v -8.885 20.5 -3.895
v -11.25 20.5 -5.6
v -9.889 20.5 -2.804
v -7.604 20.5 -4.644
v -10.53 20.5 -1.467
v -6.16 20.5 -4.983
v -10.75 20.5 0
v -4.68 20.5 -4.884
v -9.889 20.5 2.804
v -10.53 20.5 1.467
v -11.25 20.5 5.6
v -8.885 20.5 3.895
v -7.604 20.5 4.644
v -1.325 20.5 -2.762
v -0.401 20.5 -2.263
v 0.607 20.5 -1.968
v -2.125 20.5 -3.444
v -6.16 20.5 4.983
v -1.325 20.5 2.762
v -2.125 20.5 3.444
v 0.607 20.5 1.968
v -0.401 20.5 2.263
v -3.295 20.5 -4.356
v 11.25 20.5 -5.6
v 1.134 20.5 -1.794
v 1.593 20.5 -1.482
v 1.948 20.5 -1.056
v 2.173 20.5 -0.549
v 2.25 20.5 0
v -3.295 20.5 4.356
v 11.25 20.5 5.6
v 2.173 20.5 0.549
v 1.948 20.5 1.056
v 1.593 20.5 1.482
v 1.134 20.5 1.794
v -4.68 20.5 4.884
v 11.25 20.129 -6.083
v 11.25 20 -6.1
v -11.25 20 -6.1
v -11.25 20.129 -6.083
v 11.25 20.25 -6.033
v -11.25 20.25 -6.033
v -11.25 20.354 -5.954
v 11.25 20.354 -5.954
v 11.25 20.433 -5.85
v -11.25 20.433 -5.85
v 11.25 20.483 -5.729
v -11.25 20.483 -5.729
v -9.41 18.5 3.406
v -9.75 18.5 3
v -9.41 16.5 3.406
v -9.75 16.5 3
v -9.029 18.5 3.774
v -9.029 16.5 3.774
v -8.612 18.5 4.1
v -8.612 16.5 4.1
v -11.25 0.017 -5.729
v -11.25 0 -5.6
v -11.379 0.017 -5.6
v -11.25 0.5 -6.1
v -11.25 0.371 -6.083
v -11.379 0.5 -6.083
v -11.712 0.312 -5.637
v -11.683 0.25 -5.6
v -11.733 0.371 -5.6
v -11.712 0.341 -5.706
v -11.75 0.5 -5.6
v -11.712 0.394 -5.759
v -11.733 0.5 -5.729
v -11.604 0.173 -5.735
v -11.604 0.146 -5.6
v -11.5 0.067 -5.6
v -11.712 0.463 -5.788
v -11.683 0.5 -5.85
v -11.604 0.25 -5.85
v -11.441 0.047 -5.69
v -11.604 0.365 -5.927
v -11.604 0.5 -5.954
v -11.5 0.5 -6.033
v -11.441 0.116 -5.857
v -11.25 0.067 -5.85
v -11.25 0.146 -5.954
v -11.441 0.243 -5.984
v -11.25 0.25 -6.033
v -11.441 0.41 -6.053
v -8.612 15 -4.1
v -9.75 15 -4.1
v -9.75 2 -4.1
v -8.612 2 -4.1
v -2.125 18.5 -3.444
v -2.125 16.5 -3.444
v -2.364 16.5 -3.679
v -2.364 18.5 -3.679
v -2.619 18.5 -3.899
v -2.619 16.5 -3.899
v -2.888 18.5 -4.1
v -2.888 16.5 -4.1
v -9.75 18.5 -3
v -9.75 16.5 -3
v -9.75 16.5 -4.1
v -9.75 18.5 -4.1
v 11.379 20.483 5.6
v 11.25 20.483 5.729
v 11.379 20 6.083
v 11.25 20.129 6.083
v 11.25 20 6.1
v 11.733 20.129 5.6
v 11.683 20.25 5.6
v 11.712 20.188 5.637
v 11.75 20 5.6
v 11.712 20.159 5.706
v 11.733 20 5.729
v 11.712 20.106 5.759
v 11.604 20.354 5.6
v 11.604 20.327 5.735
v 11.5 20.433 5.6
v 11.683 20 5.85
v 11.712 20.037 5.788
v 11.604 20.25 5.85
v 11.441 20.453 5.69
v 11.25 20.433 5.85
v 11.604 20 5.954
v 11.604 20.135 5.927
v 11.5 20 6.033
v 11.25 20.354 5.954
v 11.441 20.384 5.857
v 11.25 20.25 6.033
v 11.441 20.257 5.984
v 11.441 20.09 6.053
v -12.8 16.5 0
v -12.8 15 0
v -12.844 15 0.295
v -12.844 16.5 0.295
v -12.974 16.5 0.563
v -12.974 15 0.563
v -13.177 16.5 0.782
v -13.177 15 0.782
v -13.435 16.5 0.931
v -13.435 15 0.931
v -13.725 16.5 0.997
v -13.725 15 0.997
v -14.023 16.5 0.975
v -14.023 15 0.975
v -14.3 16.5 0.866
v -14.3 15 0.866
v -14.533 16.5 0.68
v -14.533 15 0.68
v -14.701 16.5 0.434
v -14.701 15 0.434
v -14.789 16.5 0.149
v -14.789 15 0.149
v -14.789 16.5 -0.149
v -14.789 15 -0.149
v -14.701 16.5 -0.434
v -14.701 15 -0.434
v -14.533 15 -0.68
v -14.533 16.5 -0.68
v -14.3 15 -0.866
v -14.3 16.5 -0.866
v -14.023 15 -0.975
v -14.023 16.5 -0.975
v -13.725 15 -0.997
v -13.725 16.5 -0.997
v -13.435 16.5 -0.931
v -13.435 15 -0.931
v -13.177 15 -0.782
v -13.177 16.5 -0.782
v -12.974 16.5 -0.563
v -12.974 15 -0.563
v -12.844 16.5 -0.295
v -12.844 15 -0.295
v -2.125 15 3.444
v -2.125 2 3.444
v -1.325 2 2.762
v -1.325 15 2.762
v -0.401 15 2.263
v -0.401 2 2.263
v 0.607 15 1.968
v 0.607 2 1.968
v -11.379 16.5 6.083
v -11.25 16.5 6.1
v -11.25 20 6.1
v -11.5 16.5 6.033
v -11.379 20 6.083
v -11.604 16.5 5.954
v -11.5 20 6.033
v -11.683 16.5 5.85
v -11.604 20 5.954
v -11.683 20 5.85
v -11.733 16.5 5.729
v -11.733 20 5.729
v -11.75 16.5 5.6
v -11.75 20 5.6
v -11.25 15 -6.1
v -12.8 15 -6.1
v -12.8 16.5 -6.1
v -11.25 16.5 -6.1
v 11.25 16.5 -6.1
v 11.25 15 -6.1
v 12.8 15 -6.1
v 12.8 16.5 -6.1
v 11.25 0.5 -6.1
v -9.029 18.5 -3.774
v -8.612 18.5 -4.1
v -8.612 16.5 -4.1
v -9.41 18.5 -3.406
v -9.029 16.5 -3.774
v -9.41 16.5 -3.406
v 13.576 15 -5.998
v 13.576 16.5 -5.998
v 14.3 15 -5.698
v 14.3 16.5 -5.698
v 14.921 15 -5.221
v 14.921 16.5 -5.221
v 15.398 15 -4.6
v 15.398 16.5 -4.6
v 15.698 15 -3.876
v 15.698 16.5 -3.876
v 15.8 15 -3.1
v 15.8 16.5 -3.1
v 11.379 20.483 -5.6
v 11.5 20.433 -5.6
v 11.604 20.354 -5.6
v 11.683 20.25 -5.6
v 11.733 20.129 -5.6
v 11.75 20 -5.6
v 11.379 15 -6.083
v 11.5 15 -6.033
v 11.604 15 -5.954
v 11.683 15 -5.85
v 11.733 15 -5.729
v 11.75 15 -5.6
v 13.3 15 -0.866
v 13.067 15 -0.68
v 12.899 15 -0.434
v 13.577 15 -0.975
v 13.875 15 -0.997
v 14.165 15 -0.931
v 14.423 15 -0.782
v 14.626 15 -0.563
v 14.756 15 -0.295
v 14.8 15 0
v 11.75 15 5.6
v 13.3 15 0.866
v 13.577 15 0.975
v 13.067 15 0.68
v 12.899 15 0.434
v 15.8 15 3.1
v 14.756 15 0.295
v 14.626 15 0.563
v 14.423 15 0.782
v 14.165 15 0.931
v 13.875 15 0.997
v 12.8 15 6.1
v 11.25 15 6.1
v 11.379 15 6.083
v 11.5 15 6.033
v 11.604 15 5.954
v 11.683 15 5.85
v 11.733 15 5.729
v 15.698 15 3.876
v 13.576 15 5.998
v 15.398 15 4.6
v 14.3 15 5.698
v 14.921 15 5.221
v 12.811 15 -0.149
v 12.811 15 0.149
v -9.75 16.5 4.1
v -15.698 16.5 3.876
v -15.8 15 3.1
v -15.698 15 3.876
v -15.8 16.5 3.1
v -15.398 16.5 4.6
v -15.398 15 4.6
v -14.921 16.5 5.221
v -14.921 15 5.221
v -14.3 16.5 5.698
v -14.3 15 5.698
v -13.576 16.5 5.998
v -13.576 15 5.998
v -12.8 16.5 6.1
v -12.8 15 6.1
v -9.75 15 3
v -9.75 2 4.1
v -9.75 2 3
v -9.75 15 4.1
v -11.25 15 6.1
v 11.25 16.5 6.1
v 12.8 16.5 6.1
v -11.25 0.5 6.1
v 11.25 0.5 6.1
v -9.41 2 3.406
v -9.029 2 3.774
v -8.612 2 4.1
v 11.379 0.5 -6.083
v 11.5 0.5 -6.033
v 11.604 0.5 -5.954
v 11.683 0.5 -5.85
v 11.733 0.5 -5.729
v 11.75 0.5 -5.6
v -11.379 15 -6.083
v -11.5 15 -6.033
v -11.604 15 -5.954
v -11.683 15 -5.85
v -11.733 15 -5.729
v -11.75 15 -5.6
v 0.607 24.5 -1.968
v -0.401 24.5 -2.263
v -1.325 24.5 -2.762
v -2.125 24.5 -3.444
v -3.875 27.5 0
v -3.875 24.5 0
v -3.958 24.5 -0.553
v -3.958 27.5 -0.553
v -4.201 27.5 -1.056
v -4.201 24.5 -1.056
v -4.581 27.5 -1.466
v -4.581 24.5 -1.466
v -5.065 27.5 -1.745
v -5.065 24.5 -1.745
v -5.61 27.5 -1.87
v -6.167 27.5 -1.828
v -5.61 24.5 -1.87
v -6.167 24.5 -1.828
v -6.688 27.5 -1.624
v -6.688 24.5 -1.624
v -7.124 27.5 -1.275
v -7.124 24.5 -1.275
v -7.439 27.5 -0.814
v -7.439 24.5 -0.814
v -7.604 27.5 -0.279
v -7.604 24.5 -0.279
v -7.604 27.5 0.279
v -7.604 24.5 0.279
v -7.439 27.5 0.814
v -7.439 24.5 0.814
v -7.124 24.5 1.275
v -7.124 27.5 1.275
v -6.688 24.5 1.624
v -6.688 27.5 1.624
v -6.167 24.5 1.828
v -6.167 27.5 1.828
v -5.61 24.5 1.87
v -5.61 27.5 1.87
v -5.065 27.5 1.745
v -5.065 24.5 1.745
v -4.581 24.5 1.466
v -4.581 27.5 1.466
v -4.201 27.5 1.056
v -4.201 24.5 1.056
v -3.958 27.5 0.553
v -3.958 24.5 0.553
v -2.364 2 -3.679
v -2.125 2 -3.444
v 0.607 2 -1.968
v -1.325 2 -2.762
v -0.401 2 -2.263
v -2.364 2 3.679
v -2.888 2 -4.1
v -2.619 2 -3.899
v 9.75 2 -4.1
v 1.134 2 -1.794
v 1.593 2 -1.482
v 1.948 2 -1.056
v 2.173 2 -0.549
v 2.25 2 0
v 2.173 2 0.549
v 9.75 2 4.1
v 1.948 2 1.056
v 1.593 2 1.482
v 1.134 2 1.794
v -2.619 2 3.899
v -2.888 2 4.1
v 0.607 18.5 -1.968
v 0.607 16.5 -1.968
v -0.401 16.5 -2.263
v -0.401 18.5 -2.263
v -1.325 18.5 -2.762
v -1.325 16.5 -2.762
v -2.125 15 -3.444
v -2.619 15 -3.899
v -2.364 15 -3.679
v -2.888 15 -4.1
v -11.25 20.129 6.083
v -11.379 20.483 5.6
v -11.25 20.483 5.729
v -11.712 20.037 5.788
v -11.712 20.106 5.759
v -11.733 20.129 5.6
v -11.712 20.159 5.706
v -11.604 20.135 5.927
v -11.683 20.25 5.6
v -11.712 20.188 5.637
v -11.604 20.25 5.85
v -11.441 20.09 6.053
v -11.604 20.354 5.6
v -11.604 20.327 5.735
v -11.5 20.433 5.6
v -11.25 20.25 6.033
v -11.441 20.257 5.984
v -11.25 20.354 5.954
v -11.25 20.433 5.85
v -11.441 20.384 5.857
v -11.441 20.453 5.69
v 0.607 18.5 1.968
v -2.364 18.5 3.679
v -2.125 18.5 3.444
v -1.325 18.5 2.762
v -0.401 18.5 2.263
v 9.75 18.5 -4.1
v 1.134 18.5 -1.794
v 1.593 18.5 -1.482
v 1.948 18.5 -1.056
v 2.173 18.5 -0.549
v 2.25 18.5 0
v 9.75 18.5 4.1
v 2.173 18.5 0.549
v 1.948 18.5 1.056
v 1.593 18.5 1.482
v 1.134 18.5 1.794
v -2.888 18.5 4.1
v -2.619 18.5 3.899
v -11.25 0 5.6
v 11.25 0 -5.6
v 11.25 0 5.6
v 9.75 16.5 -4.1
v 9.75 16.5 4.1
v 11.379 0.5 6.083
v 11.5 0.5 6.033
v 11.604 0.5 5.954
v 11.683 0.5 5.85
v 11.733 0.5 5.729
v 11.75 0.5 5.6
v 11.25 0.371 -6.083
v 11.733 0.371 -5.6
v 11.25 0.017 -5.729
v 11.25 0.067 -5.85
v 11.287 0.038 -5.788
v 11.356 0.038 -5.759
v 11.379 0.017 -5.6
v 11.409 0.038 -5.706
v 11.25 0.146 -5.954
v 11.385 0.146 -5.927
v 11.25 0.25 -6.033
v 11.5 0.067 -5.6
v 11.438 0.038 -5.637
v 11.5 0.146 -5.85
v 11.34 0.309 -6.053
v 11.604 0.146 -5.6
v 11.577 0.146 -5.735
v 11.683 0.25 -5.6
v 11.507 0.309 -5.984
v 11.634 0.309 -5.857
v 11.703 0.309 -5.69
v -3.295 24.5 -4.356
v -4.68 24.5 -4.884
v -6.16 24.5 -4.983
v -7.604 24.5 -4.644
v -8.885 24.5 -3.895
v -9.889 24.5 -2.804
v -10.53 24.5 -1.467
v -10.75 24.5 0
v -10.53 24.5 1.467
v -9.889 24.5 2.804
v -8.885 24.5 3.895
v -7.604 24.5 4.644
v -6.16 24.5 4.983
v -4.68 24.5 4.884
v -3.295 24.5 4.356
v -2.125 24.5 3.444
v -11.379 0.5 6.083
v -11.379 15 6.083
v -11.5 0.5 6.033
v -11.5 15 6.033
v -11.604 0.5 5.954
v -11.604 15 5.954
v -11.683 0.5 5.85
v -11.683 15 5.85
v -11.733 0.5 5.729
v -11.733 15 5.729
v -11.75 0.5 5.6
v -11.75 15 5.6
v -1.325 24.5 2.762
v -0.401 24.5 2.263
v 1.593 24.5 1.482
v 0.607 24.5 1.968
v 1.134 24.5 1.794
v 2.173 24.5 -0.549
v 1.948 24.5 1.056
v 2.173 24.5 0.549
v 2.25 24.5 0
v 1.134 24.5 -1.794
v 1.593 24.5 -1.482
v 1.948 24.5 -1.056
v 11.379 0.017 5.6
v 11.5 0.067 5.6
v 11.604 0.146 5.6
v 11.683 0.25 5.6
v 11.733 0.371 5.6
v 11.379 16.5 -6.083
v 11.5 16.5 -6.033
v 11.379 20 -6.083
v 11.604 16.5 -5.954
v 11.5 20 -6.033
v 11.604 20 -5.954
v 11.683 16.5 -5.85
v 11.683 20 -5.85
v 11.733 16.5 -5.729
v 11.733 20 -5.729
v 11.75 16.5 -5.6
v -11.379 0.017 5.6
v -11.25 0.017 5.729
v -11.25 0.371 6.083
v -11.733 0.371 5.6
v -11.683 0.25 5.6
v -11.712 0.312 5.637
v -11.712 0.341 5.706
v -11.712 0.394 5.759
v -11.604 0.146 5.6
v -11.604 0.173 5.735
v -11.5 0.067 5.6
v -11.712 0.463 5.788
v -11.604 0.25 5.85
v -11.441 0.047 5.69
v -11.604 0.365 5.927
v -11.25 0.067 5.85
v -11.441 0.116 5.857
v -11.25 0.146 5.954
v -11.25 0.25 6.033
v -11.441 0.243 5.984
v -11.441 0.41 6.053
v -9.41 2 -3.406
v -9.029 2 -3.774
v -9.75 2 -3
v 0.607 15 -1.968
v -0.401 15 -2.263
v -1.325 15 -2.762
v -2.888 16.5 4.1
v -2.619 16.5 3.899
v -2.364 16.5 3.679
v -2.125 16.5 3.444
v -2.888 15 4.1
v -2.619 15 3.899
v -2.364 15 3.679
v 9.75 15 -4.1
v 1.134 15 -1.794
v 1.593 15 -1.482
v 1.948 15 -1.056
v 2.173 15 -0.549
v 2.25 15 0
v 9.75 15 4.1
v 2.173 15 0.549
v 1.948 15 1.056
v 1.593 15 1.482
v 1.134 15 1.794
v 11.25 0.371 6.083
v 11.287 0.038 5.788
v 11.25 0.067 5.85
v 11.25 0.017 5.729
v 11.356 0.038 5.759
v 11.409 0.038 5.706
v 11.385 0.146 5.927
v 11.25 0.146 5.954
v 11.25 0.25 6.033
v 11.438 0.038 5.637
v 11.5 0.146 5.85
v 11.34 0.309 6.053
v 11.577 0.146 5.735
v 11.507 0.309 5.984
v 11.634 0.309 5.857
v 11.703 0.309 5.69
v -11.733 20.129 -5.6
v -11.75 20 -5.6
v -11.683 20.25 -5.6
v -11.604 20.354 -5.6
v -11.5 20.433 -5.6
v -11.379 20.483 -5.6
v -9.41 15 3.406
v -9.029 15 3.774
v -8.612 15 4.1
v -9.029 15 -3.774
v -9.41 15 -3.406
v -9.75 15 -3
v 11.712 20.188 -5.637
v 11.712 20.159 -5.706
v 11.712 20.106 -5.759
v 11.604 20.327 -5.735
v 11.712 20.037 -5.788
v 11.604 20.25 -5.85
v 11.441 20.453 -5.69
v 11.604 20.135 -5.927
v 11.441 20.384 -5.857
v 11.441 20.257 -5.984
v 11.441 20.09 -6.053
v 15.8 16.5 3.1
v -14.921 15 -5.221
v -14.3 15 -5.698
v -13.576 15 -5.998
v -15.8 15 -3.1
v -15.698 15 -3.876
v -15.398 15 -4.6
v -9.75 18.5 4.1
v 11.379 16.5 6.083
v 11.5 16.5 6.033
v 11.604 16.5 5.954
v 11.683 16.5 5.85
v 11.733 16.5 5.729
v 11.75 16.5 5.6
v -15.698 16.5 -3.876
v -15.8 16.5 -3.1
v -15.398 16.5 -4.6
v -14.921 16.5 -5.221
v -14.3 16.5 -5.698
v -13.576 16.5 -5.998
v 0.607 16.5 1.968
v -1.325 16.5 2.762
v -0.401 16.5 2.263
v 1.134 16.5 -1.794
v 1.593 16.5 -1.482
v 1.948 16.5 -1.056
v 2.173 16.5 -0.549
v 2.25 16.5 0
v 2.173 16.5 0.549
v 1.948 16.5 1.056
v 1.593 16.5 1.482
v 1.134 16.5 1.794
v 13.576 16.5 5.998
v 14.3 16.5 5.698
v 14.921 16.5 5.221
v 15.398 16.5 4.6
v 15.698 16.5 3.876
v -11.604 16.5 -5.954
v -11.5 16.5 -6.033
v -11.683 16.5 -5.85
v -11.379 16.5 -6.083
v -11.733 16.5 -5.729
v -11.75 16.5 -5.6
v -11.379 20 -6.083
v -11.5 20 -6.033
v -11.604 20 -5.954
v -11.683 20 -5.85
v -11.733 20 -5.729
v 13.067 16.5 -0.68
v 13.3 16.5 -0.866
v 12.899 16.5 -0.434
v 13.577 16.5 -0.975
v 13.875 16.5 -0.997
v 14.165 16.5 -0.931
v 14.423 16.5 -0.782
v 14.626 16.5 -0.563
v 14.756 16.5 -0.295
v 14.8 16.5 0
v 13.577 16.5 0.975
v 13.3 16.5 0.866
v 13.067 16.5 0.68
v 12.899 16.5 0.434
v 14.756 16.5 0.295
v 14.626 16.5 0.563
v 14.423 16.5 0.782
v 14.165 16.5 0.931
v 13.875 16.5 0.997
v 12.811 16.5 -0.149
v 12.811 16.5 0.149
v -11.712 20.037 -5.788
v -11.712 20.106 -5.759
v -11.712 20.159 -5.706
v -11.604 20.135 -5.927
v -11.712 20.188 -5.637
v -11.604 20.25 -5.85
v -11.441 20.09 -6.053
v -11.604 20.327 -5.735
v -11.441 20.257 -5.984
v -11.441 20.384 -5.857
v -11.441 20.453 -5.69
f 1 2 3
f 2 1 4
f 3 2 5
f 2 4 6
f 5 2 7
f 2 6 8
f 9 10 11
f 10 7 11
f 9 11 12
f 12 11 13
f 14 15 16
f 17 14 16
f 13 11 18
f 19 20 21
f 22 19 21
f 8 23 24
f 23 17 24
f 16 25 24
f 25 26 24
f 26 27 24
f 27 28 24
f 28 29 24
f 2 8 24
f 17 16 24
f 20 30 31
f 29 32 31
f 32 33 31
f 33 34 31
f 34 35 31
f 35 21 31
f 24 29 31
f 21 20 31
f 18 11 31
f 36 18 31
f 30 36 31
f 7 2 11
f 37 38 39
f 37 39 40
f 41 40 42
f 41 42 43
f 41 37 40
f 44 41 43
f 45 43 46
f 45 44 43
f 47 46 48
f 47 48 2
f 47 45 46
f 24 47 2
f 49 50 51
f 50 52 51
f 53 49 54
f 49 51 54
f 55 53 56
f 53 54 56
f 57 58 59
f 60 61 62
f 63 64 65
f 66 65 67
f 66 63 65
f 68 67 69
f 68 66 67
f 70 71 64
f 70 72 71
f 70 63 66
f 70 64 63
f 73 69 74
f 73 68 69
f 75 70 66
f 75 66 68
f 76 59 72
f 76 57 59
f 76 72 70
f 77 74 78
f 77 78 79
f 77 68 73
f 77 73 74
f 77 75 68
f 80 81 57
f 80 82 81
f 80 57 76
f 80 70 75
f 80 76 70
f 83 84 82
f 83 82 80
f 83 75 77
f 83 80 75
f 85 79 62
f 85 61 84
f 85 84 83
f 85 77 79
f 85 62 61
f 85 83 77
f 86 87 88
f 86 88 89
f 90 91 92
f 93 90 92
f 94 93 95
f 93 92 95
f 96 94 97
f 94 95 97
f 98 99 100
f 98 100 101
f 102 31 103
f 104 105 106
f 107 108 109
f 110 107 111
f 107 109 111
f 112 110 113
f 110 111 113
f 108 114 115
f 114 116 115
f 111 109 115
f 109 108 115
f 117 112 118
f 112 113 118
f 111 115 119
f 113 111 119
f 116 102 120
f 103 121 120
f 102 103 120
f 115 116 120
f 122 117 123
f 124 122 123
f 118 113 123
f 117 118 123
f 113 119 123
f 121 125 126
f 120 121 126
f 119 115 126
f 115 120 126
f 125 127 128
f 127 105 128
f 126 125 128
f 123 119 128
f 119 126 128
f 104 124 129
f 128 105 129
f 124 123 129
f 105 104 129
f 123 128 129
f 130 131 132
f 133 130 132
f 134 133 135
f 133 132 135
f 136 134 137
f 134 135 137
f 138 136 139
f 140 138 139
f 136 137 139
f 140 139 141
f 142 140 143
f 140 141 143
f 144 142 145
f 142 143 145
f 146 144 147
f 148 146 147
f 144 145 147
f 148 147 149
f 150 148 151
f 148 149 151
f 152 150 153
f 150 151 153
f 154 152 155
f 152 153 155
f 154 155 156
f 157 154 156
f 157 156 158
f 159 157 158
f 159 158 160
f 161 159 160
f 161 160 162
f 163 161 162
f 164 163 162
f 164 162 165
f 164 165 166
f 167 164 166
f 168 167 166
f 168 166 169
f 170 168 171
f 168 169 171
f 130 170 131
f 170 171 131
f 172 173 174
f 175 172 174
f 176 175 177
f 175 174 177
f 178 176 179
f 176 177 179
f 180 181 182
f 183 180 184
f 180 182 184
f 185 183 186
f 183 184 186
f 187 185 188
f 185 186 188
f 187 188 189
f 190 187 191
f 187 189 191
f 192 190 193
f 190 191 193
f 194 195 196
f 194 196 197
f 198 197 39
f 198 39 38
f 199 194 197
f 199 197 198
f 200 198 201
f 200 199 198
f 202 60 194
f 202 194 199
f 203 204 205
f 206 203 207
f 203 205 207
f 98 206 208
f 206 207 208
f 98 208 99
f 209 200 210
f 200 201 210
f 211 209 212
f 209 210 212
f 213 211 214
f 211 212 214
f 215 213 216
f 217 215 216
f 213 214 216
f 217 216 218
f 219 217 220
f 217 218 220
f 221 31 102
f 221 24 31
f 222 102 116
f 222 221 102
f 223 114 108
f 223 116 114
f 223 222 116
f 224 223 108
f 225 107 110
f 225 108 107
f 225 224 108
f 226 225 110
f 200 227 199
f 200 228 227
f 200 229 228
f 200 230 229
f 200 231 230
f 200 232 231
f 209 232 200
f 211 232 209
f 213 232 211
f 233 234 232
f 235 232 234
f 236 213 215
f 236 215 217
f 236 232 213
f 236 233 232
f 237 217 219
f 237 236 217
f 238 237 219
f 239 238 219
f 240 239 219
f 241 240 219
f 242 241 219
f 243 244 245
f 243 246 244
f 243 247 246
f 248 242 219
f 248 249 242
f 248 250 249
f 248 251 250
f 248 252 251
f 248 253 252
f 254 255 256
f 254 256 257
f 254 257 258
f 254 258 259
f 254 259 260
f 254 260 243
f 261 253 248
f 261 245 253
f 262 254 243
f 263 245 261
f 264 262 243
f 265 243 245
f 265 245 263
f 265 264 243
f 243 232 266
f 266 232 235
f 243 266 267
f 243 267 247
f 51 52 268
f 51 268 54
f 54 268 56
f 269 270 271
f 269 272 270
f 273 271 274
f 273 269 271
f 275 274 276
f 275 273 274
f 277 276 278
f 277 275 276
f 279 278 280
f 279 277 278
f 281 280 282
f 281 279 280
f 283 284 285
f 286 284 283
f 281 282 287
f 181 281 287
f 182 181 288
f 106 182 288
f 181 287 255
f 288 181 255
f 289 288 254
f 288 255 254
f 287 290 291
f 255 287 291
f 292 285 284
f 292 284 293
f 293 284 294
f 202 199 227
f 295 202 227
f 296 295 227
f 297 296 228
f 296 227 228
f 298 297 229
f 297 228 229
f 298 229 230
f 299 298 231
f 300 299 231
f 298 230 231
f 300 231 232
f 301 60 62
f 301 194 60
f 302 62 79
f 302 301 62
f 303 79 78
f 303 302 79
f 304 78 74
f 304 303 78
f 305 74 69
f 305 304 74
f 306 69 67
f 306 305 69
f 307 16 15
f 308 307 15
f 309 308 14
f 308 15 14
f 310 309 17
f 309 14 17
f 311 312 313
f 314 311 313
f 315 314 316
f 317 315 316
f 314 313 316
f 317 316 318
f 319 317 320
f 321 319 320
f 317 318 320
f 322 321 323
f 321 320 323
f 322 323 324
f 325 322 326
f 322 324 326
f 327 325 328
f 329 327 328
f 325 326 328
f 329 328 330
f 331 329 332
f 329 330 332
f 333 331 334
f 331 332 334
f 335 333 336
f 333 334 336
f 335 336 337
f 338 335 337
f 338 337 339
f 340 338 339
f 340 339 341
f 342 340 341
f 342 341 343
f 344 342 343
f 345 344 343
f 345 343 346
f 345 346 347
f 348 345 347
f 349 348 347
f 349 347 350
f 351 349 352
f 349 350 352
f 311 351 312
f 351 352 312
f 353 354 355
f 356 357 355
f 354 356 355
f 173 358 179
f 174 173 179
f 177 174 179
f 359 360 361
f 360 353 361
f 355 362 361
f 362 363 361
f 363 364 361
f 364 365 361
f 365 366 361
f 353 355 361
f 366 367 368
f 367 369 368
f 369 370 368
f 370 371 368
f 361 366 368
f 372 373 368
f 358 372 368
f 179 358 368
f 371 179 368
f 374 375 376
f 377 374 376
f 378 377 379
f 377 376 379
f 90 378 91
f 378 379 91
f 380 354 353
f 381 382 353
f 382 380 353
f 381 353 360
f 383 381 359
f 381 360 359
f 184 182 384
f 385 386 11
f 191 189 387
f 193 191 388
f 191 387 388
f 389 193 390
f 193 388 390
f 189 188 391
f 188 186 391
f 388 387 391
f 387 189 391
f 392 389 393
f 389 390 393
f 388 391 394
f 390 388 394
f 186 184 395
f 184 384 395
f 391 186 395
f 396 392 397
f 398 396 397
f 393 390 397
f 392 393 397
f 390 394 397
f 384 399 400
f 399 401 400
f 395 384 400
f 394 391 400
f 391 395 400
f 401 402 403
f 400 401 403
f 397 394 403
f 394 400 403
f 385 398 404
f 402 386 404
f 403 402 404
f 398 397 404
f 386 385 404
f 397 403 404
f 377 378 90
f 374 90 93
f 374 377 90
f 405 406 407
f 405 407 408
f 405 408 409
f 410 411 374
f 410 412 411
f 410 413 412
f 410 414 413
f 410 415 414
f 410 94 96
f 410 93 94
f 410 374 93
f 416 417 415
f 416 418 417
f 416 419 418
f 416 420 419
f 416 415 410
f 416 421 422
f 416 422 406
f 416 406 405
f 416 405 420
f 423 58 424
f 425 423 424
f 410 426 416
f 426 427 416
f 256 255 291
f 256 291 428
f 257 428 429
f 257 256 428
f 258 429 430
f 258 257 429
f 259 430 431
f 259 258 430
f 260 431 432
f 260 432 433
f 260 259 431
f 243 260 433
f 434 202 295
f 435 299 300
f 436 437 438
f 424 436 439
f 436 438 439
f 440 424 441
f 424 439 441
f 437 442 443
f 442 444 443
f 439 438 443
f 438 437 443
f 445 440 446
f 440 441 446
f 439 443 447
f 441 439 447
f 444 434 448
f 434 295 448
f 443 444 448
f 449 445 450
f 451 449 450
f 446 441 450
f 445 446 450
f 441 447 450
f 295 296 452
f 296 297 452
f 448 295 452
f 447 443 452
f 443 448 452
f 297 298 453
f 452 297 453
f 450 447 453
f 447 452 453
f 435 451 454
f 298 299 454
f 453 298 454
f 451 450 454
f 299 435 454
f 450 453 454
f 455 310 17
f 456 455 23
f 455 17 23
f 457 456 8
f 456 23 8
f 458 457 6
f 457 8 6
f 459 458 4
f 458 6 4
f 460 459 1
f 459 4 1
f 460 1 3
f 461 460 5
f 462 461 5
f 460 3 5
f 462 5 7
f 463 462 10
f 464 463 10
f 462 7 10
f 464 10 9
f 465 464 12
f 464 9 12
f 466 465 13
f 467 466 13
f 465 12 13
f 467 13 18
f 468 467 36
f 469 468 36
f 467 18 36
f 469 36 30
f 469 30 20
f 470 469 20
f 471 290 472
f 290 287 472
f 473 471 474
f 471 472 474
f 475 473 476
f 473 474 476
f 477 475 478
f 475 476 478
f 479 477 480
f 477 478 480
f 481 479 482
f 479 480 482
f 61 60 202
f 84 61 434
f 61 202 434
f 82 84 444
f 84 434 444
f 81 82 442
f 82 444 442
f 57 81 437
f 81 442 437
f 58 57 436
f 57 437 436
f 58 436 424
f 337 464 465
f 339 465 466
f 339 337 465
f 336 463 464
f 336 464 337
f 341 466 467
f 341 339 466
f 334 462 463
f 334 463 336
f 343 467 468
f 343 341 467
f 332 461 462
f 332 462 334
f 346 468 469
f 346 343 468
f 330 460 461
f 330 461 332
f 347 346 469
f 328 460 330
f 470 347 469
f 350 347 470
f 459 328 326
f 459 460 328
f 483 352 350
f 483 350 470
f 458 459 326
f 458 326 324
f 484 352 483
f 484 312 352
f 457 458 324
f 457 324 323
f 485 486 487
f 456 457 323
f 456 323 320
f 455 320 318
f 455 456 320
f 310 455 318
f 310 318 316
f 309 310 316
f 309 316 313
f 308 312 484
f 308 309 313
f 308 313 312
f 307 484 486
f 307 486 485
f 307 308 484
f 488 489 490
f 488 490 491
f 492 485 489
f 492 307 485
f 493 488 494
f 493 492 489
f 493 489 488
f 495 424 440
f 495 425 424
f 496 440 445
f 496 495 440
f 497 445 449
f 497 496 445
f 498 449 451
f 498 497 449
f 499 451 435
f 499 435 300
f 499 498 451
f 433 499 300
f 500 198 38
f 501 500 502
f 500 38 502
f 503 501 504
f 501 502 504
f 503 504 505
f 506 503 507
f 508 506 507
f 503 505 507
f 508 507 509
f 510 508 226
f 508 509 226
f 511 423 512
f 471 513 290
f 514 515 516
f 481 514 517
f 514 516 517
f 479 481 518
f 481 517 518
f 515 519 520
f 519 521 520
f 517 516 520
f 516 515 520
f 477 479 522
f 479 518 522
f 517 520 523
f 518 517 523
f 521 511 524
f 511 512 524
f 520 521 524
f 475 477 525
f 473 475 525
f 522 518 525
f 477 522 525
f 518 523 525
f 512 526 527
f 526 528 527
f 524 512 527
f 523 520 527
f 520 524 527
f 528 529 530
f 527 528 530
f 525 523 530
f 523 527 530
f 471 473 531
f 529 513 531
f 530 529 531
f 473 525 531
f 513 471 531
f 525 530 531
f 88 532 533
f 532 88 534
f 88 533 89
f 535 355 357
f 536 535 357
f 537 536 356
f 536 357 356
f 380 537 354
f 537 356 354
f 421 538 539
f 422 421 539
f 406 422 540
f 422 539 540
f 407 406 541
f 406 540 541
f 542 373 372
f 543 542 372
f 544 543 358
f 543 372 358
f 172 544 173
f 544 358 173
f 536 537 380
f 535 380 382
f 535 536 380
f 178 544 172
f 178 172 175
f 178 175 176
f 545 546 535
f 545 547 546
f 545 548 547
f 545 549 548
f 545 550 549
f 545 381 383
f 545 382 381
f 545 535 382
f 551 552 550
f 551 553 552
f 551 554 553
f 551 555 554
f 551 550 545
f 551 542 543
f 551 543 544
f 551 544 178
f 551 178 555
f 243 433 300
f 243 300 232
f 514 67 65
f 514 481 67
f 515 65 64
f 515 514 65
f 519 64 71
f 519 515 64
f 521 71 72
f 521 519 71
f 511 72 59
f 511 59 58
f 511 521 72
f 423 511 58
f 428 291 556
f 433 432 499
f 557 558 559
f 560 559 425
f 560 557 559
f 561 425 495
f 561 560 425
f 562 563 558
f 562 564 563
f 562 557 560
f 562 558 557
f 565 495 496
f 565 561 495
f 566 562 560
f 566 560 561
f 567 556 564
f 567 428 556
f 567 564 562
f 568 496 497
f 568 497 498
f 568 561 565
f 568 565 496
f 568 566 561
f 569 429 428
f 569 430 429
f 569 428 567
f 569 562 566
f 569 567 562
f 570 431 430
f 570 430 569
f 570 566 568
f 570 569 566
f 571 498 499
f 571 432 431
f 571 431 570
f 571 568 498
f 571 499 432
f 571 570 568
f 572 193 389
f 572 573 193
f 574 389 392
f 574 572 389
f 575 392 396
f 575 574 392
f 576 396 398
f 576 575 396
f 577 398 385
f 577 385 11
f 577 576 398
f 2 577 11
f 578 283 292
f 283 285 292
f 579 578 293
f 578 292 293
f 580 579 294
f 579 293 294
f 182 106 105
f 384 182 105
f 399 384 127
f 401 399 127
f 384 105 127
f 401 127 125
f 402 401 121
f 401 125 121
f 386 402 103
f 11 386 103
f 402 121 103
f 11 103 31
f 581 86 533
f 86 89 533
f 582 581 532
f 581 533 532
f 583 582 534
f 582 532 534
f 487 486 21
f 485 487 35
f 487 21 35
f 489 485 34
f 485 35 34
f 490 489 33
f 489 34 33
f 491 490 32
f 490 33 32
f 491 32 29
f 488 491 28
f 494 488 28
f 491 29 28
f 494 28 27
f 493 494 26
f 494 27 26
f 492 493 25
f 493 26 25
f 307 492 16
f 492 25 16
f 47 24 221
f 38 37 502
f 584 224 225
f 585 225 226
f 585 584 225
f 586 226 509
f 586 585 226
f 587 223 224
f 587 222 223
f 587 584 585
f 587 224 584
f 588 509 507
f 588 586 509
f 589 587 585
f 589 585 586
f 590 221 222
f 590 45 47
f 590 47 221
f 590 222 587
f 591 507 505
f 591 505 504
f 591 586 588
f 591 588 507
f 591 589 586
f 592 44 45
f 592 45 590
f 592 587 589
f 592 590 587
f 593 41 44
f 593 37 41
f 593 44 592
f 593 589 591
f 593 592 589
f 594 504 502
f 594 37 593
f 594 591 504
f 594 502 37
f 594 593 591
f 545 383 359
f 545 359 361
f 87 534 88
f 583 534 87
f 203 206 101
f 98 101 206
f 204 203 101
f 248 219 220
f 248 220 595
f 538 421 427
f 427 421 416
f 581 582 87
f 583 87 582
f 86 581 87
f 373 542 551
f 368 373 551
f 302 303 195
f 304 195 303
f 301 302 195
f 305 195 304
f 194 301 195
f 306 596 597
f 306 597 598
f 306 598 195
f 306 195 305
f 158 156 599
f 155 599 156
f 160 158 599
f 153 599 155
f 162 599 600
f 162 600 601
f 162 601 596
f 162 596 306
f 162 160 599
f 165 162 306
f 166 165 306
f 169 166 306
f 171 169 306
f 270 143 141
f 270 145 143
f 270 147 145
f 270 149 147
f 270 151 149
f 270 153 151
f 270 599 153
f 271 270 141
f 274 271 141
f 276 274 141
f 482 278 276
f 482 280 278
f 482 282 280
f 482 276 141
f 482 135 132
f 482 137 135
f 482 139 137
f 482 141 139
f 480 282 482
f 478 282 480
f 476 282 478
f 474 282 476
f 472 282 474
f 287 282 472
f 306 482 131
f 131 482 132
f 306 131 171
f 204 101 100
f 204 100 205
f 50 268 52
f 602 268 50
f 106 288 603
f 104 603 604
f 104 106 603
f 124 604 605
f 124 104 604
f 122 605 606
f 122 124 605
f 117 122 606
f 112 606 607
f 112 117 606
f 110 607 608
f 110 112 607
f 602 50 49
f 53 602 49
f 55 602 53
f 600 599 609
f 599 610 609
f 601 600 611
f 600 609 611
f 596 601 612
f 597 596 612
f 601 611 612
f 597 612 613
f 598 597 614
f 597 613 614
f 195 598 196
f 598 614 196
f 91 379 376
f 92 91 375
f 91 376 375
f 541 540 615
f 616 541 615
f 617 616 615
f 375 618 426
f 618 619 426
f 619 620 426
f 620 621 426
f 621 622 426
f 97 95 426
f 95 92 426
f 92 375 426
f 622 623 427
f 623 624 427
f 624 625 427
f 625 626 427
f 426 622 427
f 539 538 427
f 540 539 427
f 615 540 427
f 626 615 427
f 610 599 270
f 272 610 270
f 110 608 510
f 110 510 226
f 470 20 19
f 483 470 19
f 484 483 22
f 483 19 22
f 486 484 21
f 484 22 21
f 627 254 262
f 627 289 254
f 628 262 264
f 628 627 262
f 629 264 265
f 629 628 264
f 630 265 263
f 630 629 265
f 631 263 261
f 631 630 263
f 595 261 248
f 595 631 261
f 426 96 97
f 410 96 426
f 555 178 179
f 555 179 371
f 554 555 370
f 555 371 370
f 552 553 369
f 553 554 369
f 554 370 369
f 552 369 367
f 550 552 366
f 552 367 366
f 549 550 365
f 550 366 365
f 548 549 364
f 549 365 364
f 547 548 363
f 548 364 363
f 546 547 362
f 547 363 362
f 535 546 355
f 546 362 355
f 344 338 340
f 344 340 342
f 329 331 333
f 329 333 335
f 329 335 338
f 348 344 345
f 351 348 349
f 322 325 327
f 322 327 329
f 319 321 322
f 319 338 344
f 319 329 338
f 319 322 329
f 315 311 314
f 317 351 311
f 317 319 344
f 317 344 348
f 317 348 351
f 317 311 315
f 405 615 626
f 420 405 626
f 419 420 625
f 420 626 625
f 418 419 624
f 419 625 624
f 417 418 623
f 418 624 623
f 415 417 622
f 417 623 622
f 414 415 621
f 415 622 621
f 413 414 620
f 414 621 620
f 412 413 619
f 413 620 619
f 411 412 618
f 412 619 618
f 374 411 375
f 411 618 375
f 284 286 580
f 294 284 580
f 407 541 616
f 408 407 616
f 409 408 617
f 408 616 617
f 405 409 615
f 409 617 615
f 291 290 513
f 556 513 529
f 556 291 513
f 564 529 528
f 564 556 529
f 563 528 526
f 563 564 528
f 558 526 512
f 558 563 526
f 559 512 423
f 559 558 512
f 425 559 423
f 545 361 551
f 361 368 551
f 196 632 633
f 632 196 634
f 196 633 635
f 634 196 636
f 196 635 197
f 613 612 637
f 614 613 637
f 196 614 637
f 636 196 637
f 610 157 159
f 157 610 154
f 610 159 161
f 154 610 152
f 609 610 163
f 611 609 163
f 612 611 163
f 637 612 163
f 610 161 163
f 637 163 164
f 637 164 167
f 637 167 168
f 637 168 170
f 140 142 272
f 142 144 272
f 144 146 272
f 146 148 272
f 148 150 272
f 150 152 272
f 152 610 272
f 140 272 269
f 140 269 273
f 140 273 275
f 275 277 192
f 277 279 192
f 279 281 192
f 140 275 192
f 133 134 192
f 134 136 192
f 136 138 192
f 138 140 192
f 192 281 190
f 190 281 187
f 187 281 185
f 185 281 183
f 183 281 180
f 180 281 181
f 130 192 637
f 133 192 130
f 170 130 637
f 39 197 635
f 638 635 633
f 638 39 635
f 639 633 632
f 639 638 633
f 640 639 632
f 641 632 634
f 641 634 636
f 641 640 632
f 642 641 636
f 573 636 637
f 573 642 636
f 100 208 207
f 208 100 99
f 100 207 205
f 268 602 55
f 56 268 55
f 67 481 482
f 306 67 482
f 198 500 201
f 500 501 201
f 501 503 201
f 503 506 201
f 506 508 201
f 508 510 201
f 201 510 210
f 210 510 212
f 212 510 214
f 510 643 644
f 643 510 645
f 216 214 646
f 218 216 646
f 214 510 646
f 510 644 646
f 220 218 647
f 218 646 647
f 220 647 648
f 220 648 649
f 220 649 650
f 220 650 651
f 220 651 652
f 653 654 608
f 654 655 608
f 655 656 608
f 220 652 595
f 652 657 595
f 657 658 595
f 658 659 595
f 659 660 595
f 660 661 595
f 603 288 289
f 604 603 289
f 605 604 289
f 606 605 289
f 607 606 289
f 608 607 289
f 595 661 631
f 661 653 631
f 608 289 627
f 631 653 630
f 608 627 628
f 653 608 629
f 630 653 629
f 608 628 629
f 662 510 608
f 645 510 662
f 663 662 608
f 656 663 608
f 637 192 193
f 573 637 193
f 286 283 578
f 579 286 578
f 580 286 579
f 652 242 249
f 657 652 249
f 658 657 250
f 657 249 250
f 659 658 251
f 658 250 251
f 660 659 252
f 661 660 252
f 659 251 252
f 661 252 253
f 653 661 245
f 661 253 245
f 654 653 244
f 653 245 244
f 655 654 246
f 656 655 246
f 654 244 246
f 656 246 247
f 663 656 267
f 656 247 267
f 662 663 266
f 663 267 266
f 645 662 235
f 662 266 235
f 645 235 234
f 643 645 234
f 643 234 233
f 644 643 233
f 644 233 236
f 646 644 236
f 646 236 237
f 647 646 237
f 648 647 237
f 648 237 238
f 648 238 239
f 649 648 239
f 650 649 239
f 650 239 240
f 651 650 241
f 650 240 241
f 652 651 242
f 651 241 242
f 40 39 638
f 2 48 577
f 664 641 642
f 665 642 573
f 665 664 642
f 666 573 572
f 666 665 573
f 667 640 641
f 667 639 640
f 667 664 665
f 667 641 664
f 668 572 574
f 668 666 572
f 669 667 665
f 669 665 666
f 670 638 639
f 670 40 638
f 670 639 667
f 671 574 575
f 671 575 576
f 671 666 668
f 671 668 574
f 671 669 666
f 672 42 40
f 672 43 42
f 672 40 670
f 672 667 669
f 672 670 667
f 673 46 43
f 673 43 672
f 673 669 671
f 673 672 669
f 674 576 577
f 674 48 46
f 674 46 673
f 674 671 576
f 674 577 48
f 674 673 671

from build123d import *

# Parameters (mm, degrees)
ESQUISSE1_W        = 23.5
ESQUISSE1_H        = 20.5
CORPS_DEPTH        = 6.1
COQUE1_T           = 2
PIVOT_SORTIE_DEPTH = 24.5
ESQUISSE3_R        = 1.875
AXE_SORTIE_DEPTH   = 3
ESQUISSE4_W        = 31.6
ESQUISSE4_H        = 12.2
ESQUISSE4_R        = 1
MIP_MAP_DEPTH      = 1.5
CONG_1_R           = 3
CONG_2_R           = 0.5


with BuildPart() as part:
    # Esquisse1 → corps (new body, symmetric)
    with BuildSketch(Plane.XY):
        with Locations((0, 10.25)):
            Rectangle(ESQUISSE1_W, ESQUISSE1_H)
    extrude(amount=CORPS_DEPTH, both=True)

    # Coque1 (no face opened: a closed hollow body)
    add(offset(amount=-COQUE1_T, mode=Mode.PRIVATE), mode=Mode.SUBTRACT)

    # Esquisse2 → pivot_sortie (add)
    with BuildSketch(Plane(origin=(0, 0, 0), x_dir=(1, 0, 0), z_dir=(0, 1, 0))):
        with BuildLine():
            ThreePointArc((-2.125, 3.443744328), (-10.75, 0), (-2.125, -3.443744328))
            ThreePointArc((-2.125, -3.443744328), (-0.876409356, -2.488320716), (0.607142857, -1.967853902))
            ThreePointArc((0.607142857, -1.967853902), (2.25, 0), (0.607142857, 1.967853902))
            ThreePointArc((0.607142857, 1.967853902), (-0.876409356, 2.488320716), (-2.125, 3.443744328))
        make_face()
    extrude(amount=PIVOT_SORTIE_DEPTH)

    # Esquisse3 → axe_sortie (add)
    with BuildSketch(Plane(origin=(0, 24.5, 0), x_dir=(1, 0, 0), z_dir=(0, 1, 0))):
        with Locations((-5.75, 0)):
            Circle(ESQUISSE3_R)
    extrude(amount=AXE_SORTIE_DEPTH)

    # Esquisse4 → MIP_MAP (add)
    with BuildSketch(Plane.XZ.offset(-15)):
        Rectangle(ESQUISSE4_W, ESQUISSE4_H)
        with Locations((-13.8, 0)):
            Circle(ESQUISSE4_R, mode=Mode.SUBTRACT)
        with Locations((13.8, 0)):
            Circle(ESQUISSE4_R, mode=Mode.SUBTRACT)
    extrude(amount=-MIP_MAP_DEPTH)

    # Congé1
    cong_1_edges = [part.edges().sort_by_distance(p)[0] for p in [
        (15.8, 15.75, -6.1),
        (-15.8, 15.75, 6.1),
        (15.8, 15.75, 6.1),
        (-15.8, 15.75, -6.1),
    ]]
    fillet(cong_1_edges, radius=CONG_1_R)

    # Congé2
    cong_2_edges = [part.edges().sort_by_distance(p)[0] for p in [
        (11.75, 7.5, 6.1),
        (0, 20.5, 6.1),
        (-11.75, 18.5, 6.1),
        (0, 20.5, -6.1),
        (11.75, 7.5, -6.1),
        (0, 0, -6.1),
        (-11.75, 18.5, -6.1),
        (0, 0, 6.1),
        (-11.75, 20.5, 0),
        (11.75, 20.5, 0),
        (11.75, 0, 0),
        (-11.75, 0, 0),
        (-11.75, 7.5, -6.1),
        (11.75, 18.5, -6.1),
        (-11.75, 7.5, 6.1),
        (11.75, 18.5, 6.1),
    ]]
    fillet(cong_2_edges, radius=CONG_2_R)


solid = part.part
